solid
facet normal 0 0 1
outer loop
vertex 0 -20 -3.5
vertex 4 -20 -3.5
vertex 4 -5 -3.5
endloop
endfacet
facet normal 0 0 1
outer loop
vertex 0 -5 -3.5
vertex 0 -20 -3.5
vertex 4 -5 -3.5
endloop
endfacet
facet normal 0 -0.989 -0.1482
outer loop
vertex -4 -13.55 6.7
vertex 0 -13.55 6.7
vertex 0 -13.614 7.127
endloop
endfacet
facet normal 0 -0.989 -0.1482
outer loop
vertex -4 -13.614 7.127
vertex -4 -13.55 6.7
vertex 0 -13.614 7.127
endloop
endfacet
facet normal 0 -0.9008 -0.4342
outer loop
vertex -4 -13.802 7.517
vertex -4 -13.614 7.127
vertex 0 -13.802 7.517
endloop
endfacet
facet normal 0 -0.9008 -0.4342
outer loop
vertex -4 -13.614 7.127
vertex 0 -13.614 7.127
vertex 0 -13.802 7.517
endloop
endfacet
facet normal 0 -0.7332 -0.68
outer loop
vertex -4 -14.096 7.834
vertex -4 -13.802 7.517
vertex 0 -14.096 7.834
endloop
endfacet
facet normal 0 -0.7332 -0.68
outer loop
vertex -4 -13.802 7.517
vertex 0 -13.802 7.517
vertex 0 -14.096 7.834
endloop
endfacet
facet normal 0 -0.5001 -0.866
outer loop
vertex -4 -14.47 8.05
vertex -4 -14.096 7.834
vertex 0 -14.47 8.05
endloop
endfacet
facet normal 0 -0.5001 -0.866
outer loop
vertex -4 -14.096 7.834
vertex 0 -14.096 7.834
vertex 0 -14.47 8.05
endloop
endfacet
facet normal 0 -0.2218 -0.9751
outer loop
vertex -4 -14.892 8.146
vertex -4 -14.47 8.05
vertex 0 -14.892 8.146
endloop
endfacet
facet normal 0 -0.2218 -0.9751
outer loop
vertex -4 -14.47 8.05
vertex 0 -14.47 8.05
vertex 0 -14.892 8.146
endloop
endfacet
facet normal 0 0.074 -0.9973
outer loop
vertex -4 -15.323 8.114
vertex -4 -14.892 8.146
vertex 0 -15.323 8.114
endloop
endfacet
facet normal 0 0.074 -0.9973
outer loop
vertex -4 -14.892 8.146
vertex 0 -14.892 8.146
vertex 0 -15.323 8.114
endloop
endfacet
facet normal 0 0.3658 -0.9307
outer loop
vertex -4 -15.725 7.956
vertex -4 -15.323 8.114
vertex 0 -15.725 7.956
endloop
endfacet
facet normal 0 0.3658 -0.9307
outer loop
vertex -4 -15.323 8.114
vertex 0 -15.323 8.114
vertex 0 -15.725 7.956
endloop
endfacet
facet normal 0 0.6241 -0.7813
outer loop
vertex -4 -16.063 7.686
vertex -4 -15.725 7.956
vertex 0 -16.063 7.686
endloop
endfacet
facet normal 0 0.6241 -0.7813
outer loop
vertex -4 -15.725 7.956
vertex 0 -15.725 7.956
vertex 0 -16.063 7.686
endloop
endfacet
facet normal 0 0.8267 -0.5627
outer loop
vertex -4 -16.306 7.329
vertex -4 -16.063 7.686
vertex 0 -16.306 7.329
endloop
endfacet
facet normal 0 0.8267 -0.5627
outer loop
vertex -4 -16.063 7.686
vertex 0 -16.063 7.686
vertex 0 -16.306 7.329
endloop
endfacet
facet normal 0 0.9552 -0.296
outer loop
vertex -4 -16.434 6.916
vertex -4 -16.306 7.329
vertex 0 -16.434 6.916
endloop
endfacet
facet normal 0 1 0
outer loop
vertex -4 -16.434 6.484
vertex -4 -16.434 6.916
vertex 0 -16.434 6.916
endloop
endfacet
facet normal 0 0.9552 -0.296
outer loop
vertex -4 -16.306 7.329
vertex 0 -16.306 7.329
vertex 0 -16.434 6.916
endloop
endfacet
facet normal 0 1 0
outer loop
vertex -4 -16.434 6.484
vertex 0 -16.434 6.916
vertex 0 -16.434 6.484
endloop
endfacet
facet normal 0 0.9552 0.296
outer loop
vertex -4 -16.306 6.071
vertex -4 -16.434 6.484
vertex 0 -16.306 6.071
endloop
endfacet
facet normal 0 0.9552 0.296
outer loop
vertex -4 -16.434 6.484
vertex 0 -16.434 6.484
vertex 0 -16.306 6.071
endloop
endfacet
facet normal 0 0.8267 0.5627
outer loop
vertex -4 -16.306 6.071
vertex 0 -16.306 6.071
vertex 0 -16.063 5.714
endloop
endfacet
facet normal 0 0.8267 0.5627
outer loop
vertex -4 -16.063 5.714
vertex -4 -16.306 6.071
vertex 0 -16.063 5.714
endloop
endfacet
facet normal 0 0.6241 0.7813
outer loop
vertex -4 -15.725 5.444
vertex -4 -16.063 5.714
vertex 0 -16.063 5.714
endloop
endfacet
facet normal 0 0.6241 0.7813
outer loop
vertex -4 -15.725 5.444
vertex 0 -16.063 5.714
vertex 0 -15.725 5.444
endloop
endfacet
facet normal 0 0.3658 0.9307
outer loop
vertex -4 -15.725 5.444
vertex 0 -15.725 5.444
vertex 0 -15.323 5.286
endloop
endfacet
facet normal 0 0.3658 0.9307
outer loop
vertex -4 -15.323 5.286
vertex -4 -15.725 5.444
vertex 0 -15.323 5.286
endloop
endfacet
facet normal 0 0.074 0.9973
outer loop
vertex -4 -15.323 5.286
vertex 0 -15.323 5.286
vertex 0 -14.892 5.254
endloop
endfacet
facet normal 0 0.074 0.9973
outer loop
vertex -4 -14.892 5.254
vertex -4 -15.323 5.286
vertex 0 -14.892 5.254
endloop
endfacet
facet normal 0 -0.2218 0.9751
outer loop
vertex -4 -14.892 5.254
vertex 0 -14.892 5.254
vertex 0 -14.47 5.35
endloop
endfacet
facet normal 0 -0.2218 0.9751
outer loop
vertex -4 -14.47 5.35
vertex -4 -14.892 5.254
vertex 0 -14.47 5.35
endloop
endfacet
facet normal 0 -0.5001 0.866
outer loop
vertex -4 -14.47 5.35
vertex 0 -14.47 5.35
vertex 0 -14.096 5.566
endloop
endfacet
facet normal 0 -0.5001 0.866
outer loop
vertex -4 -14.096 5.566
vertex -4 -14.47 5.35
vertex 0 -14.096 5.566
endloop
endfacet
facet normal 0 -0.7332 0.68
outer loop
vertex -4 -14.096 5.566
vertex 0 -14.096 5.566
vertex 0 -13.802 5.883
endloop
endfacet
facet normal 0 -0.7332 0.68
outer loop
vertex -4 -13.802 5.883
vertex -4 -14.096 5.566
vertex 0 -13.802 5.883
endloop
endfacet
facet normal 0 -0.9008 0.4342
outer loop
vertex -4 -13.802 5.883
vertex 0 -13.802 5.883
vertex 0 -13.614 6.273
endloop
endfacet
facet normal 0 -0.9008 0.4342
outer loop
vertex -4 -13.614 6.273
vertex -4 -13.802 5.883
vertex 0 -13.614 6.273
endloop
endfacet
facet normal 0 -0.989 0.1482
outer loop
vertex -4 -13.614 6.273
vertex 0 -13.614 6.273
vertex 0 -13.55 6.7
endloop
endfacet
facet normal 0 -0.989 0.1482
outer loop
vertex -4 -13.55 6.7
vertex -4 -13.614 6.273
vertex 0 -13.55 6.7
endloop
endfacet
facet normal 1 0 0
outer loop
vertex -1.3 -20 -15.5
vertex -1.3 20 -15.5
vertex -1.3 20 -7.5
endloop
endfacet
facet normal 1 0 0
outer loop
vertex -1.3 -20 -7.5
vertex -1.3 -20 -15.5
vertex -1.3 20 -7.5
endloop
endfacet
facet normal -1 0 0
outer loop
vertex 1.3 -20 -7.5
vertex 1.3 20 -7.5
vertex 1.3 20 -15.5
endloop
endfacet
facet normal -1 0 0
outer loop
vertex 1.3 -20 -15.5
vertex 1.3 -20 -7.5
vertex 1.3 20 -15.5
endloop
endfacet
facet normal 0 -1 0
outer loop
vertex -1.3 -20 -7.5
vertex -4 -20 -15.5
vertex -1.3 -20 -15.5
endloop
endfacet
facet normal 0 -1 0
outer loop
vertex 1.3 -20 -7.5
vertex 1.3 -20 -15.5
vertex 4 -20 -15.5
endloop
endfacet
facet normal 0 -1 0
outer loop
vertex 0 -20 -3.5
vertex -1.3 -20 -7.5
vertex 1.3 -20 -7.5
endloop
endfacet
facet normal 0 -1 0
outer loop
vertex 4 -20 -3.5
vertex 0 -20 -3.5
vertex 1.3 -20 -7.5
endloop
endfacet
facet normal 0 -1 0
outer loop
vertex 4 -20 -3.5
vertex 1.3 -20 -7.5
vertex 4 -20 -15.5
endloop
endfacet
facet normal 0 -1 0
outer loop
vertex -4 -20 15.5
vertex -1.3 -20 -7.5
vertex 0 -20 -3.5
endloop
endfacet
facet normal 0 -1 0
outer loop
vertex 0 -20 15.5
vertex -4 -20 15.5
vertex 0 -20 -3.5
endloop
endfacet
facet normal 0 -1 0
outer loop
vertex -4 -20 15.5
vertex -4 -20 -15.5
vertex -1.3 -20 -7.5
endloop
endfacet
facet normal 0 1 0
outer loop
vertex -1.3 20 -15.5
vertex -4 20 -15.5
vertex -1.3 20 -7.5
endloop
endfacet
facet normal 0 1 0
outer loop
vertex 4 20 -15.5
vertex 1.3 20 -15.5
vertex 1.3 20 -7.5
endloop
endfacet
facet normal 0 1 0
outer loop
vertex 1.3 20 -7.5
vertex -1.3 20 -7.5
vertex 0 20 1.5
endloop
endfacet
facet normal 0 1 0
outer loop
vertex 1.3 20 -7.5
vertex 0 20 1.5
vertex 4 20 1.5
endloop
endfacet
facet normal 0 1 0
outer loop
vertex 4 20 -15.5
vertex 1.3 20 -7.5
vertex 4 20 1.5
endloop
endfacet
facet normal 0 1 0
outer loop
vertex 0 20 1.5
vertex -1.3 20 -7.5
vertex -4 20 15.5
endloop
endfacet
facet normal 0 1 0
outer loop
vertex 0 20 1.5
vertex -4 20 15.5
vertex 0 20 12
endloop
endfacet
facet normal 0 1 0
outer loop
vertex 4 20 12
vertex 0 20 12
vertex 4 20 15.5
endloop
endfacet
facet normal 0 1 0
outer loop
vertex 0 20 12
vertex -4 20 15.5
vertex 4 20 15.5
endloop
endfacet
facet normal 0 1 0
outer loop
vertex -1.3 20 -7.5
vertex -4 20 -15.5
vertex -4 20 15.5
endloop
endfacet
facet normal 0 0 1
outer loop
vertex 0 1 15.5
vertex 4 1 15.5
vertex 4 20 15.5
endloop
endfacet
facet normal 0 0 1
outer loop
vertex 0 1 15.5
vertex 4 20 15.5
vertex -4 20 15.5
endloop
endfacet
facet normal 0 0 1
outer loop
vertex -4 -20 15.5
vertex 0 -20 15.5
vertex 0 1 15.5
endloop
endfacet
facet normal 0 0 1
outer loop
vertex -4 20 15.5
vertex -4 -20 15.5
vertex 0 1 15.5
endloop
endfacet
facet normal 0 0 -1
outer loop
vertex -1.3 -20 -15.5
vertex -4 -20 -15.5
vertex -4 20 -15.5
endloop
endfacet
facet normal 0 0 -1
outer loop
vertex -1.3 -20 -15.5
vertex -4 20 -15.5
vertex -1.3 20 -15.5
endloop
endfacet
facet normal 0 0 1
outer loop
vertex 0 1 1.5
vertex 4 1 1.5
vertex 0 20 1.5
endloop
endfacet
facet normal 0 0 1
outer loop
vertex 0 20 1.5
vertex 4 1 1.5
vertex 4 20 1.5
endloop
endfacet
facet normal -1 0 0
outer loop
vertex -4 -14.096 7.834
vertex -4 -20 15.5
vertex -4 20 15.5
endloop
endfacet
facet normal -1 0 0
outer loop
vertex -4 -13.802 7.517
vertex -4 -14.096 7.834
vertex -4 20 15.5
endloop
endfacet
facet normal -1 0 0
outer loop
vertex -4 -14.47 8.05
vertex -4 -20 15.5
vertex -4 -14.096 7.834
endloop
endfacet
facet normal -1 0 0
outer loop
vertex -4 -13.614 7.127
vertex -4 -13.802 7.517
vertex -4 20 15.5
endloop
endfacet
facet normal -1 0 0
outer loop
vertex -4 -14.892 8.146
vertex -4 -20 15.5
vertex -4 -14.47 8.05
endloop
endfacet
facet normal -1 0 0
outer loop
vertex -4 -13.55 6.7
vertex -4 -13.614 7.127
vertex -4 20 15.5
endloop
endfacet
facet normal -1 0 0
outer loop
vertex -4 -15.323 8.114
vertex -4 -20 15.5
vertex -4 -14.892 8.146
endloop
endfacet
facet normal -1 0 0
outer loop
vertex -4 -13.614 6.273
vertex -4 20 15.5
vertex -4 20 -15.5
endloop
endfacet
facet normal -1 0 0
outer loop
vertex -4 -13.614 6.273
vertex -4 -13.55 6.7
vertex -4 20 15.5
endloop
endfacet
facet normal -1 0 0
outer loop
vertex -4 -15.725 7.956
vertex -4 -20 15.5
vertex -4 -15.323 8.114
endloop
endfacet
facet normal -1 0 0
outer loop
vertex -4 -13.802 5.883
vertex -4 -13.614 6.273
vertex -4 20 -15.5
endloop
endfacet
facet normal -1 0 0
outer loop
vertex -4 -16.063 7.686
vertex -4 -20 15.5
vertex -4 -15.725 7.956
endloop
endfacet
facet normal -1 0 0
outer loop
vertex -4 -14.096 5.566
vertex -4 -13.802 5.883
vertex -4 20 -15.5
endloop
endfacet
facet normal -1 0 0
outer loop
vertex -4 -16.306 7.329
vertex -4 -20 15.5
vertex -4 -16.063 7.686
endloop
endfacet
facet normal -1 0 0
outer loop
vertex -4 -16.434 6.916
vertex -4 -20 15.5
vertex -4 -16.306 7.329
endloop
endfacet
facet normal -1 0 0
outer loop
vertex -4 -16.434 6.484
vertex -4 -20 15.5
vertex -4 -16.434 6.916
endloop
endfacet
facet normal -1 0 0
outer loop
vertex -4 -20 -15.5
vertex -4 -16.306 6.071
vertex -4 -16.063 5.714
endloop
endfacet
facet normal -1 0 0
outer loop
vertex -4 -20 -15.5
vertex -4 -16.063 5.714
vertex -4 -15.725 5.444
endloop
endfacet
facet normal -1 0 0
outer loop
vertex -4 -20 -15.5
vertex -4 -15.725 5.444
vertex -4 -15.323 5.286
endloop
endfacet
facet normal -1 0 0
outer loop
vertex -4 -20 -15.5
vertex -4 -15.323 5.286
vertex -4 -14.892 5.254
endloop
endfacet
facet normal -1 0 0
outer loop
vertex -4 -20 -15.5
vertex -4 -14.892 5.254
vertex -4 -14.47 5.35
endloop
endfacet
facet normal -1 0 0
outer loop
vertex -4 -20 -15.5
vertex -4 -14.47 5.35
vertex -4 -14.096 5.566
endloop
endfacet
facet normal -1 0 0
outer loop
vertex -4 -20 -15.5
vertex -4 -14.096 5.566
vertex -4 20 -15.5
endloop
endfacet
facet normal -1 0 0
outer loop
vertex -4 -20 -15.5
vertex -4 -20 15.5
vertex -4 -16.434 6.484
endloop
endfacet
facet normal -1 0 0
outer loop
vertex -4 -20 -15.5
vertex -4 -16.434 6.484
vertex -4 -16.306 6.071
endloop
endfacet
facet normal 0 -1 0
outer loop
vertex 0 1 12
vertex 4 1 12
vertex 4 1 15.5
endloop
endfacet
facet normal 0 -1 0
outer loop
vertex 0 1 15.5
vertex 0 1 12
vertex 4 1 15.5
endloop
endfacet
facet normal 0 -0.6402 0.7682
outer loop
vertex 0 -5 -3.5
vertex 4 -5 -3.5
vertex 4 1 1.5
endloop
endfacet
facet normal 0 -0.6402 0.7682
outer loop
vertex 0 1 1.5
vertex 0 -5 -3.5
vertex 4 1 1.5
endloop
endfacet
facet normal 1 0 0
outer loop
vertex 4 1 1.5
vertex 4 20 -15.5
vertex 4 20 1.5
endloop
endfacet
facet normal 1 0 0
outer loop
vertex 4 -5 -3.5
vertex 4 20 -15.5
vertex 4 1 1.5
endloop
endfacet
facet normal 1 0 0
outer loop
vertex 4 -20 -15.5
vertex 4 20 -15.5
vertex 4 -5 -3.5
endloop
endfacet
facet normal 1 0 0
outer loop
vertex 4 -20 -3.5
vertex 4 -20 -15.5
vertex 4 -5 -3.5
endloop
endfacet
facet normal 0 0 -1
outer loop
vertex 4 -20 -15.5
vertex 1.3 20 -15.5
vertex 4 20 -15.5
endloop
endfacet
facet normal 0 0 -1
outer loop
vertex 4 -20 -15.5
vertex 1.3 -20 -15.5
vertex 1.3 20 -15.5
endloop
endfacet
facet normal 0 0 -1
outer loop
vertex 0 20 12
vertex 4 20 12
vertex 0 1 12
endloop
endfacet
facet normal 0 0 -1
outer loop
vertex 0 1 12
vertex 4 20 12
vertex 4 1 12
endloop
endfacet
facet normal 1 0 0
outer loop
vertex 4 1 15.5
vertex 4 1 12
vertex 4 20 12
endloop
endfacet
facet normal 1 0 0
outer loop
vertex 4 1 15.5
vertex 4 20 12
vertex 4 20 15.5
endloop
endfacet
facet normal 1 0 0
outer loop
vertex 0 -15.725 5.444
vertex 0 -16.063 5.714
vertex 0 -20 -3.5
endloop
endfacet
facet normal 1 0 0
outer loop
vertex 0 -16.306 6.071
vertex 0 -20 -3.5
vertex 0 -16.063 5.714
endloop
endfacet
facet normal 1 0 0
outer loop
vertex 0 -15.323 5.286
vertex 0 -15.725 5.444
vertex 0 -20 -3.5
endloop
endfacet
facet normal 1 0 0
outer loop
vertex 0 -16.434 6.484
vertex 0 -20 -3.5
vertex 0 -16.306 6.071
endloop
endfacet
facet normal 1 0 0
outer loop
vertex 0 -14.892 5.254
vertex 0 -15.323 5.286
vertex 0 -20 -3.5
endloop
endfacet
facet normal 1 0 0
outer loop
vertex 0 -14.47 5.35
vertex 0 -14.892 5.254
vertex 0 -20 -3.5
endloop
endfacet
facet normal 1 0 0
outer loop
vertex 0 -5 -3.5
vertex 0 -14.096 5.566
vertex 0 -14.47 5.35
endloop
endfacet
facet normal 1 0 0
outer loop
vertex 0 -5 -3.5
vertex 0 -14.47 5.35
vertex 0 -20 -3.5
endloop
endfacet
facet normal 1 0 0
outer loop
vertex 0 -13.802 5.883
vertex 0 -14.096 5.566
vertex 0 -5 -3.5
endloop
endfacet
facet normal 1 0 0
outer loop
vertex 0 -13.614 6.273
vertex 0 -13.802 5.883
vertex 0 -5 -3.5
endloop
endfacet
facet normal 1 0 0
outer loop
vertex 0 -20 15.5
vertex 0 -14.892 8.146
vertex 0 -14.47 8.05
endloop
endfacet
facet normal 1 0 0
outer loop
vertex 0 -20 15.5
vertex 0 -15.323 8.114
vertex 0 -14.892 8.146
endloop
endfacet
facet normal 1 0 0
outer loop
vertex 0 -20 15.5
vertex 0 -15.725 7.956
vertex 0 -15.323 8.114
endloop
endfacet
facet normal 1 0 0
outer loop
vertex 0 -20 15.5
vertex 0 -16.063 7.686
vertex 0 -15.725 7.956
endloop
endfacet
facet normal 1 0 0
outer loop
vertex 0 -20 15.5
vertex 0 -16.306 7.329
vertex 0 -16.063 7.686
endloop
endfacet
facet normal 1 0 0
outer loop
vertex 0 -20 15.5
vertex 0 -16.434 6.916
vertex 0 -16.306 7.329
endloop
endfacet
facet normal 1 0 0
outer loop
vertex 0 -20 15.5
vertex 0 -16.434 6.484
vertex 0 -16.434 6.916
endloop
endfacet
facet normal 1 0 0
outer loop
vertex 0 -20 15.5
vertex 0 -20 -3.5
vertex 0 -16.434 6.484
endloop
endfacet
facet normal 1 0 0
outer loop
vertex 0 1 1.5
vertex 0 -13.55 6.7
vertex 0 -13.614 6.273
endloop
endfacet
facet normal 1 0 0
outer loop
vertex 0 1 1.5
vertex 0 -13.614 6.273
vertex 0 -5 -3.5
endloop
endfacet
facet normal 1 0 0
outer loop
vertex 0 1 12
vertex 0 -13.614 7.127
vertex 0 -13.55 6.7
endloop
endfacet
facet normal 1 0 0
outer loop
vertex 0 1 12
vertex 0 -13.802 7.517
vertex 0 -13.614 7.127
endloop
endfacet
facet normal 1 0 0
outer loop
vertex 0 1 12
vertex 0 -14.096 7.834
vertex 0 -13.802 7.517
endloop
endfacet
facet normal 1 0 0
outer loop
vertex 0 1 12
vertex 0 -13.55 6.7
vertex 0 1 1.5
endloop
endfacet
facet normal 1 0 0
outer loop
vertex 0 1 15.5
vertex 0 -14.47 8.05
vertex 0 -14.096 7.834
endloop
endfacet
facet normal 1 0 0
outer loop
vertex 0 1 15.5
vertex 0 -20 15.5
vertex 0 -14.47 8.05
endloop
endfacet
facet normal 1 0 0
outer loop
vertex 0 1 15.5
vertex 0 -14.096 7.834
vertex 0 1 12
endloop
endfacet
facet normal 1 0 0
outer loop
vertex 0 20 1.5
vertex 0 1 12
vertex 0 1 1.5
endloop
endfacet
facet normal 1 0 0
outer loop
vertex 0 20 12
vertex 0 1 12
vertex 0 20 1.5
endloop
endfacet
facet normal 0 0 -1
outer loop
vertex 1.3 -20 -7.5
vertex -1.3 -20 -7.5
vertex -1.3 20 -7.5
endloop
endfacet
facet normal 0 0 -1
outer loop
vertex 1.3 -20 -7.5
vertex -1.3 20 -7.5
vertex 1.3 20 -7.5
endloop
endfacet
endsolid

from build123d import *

# Parameters (mm, degrees)
F1_DEPTH = 20
F3_DEPTH = 4
F4_R     = 1.45
F5_DEPTH = 25


with BuildPart() as f1:
    # F0 (on Front) → F1 (new body, symmetric)
    with BuildSketch(Plane.XZ):
        Polygon((4, -15.5), (4, 15.5), (-4, 15.5), (-4, -15.5), (-1.3, -15.5), (-1.3, -7.5), (1.3, -7.5), (1.3, -15.5), align=None)
    extrude(amount=F1_DEPTH, both=True)

    # F2 (on face) → F3 (cut, through all)
    with BuildSketch(Plane.YZ.offset(4)):
        Polygon((-20, 15.5), (-20, -3.5), (-5, -3.5), (1, 1.5), (20, 1.5), (20, 12), (1, 12), (1, 15.5), align=None)
    extrude(amount=-F3_DEPTH, mode=Mode.SUBTRACT)

    # F4 (on face) → F5 (cut)
    with BuildSketch(Plane.YZ):
        with Locations((-15, 6.7)):
            Circle(F4_R)
    extrude(amount=-F5_DEPTH, mode=Mode.SUBTRACT)


solid = f1.part
